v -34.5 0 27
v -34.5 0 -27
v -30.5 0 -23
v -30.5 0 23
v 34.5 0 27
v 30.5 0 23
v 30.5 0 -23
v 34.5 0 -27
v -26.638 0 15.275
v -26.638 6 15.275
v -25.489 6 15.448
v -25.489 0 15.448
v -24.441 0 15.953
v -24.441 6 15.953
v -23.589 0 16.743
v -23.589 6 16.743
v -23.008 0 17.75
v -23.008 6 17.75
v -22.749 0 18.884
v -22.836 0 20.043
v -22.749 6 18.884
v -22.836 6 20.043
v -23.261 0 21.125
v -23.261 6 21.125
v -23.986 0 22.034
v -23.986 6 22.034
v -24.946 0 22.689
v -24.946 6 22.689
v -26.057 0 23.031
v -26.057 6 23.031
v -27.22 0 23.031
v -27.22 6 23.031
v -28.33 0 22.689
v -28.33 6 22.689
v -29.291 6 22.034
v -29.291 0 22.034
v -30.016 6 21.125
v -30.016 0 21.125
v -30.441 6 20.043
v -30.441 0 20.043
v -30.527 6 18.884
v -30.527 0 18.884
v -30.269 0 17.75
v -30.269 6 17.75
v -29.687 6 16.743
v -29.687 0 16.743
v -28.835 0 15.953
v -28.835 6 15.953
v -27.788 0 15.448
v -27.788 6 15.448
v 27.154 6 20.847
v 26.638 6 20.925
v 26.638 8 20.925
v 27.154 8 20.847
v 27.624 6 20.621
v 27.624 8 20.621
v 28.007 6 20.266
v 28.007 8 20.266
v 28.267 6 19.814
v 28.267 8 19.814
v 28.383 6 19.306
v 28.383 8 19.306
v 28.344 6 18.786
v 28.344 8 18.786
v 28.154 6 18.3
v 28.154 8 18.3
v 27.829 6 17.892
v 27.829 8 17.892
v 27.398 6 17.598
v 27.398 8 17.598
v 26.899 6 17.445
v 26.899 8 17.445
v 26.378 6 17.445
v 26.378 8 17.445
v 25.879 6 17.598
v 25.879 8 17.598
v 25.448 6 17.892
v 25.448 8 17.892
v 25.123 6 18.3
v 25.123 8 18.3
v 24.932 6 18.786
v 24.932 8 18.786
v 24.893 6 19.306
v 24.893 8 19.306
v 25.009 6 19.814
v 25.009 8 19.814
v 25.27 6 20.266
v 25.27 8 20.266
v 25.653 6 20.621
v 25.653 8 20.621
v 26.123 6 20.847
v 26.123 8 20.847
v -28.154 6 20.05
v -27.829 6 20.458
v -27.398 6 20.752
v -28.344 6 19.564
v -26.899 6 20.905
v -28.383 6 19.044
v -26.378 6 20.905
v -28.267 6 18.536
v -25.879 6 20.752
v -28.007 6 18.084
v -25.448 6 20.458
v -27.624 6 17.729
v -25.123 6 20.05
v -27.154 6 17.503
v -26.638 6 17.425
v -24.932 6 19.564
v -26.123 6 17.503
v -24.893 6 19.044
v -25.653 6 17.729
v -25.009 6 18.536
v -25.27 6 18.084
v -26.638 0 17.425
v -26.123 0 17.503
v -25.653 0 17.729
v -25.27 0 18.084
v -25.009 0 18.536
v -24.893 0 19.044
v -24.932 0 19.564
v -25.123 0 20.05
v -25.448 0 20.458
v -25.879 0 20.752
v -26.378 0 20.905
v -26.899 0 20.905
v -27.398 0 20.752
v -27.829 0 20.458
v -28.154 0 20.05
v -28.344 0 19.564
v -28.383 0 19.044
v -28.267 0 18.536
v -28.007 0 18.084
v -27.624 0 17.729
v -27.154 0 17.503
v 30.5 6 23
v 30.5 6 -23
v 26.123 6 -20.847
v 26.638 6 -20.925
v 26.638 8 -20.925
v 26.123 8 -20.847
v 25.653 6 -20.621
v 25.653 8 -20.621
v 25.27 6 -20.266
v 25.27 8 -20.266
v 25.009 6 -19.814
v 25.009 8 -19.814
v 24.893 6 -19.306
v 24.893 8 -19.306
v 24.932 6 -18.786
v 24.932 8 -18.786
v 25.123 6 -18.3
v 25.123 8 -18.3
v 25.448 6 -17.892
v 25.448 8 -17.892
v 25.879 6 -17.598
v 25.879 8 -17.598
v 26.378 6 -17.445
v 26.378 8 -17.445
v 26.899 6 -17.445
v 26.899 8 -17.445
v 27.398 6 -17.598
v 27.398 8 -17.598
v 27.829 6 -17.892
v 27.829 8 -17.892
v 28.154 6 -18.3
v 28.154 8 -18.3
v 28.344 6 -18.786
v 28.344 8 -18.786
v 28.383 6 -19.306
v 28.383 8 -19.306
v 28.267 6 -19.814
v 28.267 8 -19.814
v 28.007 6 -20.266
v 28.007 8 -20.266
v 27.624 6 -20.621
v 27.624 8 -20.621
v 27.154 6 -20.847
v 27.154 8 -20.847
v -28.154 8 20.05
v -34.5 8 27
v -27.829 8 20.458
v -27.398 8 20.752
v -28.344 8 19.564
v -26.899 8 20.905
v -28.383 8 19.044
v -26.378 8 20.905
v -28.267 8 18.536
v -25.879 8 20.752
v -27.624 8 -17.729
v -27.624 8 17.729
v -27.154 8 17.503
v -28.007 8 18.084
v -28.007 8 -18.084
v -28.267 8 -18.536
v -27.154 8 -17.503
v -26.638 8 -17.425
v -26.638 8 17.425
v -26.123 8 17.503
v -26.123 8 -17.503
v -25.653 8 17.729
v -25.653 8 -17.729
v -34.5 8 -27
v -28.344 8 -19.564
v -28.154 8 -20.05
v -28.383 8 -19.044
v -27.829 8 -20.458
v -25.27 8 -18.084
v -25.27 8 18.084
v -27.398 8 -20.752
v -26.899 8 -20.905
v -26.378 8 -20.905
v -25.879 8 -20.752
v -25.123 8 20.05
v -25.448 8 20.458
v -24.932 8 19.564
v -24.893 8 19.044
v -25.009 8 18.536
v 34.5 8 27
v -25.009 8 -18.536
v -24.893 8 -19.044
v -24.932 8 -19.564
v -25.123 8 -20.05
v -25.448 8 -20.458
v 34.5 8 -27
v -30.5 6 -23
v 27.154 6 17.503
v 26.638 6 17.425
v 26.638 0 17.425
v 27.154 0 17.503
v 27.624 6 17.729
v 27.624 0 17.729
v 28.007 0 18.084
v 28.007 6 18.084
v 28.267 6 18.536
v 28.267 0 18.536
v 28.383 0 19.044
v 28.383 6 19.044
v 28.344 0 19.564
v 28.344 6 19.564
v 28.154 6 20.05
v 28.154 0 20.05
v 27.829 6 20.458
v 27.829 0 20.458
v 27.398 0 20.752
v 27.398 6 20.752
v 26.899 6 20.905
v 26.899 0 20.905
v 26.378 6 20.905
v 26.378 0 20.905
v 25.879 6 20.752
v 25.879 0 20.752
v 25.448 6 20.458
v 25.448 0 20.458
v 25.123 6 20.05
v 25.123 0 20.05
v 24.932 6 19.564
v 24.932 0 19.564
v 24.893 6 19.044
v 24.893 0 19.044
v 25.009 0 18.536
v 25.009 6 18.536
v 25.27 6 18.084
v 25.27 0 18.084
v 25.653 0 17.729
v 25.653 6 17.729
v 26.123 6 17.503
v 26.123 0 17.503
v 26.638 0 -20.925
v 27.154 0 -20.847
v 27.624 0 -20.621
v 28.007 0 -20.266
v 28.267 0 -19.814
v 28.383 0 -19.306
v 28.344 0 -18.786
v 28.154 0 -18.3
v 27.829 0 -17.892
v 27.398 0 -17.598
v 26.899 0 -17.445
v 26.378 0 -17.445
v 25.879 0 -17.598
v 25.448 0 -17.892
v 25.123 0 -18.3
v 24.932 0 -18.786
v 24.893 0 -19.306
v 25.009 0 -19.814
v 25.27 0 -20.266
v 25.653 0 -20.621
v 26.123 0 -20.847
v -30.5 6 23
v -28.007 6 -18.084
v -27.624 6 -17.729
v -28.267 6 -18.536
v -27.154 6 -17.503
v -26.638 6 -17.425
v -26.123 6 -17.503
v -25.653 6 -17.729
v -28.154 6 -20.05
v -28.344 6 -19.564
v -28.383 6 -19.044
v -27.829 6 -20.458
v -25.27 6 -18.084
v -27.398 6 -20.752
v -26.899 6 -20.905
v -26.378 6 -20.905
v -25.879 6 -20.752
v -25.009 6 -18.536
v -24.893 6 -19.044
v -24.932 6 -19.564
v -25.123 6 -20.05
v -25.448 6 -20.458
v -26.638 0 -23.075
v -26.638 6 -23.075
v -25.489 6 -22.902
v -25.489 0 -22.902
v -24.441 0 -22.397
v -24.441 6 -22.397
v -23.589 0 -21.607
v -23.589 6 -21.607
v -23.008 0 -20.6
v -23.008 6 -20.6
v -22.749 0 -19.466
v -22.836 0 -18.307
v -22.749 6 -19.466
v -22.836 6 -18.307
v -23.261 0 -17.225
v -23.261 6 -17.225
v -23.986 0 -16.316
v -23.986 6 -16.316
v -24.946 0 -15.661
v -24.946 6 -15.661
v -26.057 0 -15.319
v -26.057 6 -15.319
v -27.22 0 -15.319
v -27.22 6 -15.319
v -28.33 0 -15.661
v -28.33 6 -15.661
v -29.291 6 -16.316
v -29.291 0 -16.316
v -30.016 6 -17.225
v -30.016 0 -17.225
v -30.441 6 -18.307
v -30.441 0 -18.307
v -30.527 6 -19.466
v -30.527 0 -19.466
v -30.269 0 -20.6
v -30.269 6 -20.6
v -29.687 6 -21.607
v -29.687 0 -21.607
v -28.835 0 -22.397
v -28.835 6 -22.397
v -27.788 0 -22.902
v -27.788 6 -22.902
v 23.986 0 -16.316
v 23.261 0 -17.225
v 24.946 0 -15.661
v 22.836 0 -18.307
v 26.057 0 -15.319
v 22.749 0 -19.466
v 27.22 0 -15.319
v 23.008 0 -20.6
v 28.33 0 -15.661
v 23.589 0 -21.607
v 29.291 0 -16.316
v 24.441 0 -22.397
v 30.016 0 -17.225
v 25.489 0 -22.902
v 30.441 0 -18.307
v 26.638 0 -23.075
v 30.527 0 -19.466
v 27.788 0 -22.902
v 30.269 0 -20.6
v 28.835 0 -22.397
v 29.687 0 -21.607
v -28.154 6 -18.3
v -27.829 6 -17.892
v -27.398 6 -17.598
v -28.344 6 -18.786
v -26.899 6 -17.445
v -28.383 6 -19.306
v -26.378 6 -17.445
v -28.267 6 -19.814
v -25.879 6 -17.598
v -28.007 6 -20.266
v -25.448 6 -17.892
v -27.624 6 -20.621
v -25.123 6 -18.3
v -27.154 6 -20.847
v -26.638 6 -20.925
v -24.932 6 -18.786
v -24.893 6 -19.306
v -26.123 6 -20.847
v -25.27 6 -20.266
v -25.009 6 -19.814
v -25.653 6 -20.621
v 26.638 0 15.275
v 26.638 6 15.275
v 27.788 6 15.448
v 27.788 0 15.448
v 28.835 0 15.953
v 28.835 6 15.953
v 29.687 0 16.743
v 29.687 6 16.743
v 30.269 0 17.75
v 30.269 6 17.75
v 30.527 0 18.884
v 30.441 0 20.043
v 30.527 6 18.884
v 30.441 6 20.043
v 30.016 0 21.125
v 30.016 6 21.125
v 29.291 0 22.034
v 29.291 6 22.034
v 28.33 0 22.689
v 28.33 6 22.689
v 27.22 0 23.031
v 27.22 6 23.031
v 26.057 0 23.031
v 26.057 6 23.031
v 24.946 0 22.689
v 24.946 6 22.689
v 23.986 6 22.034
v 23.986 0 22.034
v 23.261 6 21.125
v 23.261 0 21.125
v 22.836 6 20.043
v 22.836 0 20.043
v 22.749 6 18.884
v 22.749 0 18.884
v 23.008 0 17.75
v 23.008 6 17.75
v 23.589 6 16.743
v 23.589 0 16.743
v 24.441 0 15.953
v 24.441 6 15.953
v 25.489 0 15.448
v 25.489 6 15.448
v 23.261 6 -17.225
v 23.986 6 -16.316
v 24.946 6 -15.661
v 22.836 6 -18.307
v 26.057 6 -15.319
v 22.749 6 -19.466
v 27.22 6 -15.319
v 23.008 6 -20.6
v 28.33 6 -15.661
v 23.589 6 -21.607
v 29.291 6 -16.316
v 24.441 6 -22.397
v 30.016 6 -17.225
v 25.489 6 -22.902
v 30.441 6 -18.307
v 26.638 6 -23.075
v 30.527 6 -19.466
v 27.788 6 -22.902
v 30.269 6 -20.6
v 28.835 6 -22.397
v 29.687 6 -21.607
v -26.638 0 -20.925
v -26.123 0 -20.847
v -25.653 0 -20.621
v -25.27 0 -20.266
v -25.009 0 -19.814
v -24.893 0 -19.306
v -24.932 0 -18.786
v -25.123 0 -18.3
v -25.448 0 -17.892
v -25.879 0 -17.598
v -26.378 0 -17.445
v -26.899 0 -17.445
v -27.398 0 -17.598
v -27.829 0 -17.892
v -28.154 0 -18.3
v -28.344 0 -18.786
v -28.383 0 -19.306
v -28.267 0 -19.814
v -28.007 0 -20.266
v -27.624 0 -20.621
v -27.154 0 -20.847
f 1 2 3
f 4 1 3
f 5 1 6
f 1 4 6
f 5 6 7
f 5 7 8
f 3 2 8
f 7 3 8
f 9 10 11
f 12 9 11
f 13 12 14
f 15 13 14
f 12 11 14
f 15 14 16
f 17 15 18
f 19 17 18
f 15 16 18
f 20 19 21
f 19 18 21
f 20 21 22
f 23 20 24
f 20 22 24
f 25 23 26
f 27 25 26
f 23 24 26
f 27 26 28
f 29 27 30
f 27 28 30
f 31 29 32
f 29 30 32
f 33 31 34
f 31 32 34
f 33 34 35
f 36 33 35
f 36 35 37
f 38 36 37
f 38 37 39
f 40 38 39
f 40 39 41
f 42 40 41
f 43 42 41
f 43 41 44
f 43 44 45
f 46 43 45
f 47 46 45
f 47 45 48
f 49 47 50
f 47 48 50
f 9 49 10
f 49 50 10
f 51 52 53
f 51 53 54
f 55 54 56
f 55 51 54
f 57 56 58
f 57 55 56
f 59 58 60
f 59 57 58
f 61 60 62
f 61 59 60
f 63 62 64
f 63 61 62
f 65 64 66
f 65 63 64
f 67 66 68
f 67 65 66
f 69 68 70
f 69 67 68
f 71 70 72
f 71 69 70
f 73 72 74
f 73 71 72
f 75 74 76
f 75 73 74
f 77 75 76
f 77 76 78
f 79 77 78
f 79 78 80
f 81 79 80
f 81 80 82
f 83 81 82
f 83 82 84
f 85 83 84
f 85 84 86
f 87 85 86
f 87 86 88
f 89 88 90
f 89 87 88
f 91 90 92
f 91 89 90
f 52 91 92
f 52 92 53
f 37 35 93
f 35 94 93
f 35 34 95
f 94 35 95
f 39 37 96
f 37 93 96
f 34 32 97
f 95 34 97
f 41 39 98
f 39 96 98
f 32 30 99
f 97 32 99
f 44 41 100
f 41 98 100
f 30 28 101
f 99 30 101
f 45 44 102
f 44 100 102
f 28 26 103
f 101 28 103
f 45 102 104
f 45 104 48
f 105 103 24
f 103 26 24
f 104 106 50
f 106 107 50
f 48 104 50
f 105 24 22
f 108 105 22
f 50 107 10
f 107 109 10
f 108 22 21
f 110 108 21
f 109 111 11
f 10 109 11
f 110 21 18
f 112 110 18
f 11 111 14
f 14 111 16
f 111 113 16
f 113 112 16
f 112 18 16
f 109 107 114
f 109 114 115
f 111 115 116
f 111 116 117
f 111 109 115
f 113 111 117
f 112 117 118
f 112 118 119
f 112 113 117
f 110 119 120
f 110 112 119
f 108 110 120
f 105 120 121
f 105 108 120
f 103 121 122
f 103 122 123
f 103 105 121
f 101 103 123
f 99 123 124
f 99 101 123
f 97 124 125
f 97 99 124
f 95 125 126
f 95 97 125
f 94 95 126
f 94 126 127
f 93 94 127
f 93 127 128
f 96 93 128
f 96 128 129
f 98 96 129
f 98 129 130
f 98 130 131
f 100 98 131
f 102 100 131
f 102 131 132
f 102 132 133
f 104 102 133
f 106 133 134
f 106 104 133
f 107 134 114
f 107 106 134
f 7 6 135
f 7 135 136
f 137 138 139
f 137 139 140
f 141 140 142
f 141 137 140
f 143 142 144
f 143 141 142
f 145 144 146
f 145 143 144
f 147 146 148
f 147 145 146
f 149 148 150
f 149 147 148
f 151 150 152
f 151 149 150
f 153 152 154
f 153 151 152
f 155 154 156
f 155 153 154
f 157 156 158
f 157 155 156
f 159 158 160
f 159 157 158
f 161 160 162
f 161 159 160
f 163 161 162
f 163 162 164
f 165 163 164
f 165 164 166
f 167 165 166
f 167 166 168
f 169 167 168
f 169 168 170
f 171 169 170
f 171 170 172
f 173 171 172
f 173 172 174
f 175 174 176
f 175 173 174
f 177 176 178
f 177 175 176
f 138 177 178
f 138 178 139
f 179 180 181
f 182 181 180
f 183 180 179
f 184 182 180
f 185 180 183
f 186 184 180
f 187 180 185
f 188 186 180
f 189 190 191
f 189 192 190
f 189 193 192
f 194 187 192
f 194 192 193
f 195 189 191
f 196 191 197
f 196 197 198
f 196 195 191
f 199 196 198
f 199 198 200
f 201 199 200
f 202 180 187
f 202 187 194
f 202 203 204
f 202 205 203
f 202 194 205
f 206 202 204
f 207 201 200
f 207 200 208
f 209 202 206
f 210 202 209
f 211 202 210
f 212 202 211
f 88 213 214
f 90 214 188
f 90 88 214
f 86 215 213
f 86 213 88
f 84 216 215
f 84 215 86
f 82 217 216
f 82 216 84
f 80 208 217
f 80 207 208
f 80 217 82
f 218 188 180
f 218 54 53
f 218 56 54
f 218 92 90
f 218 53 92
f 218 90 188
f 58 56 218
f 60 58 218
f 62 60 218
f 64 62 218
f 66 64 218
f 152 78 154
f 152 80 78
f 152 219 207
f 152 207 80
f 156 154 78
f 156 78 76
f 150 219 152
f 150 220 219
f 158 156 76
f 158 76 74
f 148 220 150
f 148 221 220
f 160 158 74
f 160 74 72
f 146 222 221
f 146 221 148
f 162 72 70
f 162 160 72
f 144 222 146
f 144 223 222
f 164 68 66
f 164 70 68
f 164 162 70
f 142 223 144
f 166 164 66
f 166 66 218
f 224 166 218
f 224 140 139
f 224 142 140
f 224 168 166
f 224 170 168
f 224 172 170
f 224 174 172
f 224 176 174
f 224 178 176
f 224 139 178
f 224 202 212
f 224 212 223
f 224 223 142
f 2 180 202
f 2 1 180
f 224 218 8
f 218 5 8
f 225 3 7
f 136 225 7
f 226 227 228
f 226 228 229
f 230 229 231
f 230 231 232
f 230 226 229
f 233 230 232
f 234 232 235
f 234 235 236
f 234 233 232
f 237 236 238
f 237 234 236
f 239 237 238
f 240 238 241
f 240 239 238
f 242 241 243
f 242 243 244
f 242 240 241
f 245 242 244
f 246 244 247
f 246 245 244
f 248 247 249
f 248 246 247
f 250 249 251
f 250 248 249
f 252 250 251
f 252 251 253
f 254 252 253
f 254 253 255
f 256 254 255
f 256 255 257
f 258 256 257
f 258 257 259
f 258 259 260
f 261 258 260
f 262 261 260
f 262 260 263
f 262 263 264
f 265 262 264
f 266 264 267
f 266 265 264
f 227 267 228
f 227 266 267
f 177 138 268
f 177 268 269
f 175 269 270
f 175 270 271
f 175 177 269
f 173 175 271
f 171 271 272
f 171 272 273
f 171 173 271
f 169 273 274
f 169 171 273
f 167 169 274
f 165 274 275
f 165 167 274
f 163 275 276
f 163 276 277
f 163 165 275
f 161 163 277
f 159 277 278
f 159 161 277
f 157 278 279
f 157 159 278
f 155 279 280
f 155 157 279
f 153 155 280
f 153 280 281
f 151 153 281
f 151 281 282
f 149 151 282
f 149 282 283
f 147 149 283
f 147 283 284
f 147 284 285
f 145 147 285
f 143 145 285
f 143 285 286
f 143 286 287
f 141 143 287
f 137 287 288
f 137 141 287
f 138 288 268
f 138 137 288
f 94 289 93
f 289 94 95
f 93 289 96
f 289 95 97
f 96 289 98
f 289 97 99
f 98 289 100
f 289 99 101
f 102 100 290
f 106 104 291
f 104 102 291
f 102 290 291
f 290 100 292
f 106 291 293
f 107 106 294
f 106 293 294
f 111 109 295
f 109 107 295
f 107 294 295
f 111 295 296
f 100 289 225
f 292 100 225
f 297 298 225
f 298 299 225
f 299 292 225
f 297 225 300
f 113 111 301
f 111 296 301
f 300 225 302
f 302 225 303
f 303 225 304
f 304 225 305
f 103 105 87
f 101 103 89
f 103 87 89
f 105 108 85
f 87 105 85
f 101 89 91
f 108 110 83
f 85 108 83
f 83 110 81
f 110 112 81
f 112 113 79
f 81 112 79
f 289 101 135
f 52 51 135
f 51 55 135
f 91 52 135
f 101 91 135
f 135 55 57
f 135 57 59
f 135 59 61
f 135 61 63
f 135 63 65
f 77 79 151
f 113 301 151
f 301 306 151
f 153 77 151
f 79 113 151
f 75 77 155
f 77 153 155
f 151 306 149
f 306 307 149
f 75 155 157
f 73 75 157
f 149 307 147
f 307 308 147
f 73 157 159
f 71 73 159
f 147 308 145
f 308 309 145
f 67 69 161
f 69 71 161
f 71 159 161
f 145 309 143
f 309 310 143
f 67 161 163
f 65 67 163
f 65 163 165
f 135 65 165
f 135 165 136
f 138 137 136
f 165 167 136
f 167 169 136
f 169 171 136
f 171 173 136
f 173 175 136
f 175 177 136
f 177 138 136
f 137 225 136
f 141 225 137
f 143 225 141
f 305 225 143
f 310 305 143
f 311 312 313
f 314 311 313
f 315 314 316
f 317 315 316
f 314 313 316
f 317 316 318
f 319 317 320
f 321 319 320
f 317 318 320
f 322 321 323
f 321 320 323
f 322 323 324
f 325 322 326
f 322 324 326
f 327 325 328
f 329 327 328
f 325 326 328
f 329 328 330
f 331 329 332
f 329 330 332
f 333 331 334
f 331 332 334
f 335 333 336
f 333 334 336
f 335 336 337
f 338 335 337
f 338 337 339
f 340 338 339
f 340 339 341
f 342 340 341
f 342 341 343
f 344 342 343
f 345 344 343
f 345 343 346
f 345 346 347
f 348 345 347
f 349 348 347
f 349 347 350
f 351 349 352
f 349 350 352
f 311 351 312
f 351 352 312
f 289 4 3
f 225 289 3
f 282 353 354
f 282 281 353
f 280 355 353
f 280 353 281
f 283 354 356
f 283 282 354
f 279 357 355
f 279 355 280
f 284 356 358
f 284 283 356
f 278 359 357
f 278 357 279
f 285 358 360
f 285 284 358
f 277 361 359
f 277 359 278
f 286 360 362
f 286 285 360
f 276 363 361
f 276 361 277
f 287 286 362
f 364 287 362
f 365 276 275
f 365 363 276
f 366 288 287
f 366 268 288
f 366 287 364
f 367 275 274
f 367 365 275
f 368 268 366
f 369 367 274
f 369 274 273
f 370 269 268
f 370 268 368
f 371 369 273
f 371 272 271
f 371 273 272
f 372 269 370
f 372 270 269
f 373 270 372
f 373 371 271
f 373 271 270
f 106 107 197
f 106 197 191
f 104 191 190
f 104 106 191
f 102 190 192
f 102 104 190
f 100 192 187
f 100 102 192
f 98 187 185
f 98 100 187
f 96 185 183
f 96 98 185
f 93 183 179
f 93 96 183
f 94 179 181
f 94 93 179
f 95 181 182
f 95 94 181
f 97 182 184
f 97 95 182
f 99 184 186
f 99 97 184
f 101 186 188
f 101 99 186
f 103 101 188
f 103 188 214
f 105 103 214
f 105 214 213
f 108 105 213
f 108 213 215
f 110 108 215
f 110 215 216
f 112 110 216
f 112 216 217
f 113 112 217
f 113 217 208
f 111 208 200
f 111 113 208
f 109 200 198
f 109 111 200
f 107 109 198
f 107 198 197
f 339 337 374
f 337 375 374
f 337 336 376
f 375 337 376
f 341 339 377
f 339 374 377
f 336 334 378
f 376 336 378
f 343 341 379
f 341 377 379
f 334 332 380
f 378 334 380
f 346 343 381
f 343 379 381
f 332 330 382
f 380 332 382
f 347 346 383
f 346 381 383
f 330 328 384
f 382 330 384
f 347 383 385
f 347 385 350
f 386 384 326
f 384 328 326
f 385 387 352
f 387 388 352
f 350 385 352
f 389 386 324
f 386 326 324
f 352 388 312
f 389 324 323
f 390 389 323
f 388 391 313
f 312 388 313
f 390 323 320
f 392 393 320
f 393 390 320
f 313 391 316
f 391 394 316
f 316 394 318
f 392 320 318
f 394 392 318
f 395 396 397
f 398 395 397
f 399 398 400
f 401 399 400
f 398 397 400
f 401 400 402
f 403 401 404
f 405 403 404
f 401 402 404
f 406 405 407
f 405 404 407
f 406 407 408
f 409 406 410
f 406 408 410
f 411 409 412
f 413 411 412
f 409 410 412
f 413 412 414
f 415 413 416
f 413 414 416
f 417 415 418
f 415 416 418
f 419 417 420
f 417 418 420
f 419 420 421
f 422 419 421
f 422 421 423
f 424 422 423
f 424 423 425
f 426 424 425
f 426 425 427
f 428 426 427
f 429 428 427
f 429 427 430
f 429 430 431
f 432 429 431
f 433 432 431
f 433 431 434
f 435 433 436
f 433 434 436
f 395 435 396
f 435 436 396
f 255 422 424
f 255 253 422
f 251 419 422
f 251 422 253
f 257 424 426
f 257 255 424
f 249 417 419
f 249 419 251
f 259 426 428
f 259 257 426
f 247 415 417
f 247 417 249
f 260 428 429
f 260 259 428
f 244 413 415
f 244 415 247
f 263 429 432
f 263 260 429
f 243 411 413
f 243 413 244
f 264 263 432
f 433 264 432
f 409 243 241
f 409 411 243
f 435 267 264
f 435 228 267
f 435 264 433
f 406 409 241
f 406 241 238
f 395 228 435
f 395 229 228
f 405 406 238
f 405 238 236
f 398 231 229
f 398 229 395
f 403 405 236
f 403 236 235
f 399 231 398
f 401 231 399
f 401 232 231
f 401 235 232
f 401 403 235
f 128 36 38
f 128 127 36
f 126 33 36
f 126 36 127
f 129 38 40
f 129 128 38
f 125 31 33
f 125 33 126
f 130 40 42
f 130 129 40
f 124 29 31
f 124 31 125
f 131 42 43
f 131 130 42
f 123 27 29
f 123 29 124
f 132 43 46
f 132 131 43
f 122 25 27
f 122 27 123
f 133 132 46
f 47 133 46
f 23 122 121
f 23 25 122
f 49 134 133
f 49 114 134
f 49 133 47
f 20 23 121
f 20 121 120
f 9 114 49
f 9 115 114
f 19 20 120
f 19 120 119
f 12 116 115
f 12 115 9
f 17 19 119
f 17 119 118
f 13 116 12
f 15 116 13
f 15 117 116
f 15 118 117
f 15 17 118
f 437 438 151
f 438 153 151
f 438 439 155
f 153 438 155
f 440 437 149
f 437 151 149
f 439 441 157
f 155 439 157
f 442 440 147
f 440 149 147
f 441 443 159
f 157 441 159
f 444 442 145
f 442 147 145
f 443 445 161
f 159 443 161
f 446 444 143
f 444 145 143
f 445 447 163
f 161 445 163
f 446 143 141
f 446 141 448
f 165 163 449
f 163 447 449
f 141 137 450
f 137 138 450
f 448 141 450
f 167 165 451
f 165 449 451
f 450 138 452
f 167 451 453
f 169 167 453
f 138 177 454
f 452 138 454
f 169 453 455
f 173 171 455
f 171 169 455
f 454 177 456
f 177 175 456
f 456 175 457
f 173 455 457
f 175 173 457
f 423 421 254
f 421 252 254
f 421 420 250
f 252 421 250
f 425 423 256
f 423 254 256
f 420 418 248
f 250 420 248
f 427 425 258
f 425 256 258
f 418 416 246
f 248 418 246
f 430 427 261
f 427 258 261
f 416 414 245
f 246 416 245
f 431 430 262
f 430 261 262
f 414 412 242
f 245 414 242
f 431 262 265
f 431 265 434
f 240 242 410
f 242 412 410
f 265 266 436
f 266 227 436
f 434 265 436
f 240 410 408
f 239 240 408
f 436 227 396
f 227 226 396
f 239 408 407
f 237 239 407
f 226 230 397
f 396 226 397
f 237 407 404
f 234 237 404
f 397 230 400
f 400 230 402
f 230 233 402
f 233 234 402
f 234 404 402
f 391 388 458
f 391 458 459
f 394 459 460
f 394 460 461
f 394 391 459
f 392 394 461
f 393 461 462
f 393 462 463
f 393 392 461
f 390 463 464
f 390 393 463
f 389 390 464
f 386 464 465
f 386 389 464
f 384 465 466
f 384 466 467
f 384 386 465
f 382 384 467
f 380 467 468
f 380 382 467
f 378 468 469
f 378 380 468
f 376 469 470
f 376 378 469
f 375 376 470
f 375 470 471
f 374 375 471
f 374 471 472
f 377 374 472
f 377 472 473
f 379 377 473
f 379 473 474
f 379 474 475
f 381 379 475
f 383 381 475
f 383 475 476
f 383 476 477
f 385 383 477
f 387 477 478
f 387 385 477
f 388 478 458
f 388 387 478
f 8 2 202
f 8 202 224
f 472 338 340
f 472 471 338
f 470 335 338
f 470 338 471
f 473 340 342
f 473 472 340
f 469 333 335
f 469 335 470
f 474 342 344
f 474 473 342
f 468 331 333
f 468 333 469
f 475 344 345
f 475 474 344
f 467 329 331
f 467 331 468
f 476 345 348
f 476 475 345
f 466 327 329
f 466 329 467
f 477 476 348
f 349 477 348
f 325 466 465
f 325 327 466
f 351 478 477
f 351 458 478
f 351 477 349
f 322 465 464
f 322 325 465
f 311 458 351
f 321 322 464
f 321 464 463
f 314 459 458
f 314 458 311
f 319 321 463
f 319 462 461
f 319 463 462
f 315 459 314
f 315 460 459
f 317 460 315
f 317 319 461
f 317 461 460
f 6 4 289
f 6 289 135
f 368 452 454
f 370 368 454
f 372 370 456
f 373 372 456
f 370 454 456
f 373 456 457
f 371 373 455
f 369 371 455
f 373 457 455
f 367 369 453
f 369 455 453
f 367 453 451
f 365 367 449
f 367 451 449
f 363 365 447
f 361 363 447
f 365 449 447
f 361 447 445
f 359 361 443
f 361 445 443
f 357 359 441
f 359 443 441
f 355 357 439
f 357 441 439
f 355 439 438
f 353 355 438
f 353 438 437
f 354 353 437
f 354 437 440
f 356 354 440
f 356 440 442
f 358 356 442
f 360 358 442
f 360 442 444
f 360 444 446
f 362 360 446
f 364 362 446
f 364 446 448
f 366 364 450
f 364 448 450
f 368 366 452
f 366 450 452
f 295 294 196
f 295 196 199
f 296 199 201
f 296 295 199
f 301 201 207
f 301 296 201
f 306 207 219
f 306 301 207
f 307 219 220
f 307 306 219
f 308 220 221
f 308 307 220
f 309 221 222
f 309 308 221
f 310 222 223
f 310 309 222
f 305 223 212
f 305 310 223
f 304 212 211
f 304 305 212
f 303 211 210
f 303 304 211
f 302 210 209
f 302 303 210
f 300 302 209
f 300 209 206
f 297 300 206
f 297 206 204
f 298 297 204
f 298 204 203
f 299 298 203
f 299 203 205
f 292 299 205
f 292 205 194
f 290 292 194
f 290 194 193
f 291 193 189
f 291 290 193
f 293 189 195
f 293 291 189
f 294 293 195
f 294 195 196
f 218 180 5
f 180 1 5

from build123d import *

# Parameters (mm, degrees)
SKETCH1_W             = 69
SKETCH1_H             = 54
SKETCH1_W_2           = 61
SKETCH1_H_2           = 46
BOSS_EXTRUDE1_DEPTH   = 6
SKETCH2_W             = 69
SKETCH2_H             = 54
SKETCH2_R             = 1.75
BOSS_EXTRUDE2_DEPTH   = 2
SKETCH3_R             = 3.9
SKETCH3_R_2           = 1.75
BOSS_EXTRUDE5_DEPTH   = 6
BOSS_EXTRUDE5_2_DEPTH = 6
BOSS_EXTRUDE5_3_DEPTH = 6
BOSS_EXTRUDE5_4_DEPTH = 6


with BuildPart() as part:
    # Sketch1 → Boss-Extrude1 (new body)
    with BuildSketch(Plane(origin=(0, 0, 0), x_dir=(1, 0, 0), z_dir=(0, 1, 0))):
        Rectangle(SKETCH1_W, SKETCH1_H)
        Rectangle(SKETCH1_W_2, SKETCH1_H_2, mode=Mode.SUBTRACT)
    extrude(amount=BOSS_EXTRUDE1_DEPTH)

    # Sketch2 → Boss-Extrude2 (add)
    with BuildSketch(Plane(origin=(0, 6, 0), x_dir=(1, 0, 0), z_dir=(0, 1, 0))):
        Rectangle(SKETCH2_W, SKETCH2_H)
        with Locations(Location((-26.638347595, 19.175016295, 0), (0, 0, 270))):
            Circle(SKETCH2_R, mode=Mode.SUBTRACT)
        with Locations(Location((26.638347595, 19.175016295, 0), (0, 0, 90))):
            Circle(SKETCH2_R, mode=Mode.SUBTRACT)
        with Locations(Location((26.638347595, -19.175016295, 0), (0, 0, 270))):
            Circle(SKETCH2_R, mode=Mode.SUBTRACT)
        with Locations(Location((-26.638347595, -19.175016295, 0), (0, 0, 90))):
            Circle(SKETCH2_R, mode=Mode.SUBTRACT)
    extrude(amount=BOSS_EXTRUDE2_DEPTH)


with BuildPart() as body_2:
    # Sketch3 → Boss-Extrude5 (new body)
    with BuildSketch(Plane.XZ.offset(-6)):
        with Locations(Location((-26.638347595, 19.175016295, 0), (0, 0, 270))):
            Circle(SKETCH3_R)
        with Locations(Location((-26.638347595, 19.175016295, 0), (0, 0, 270))):
            Circle(SKETCH3_R_2, mode=Mode.SUBTRACT)
    extrude(amount=BOSS_EXTRUDE5_DEPTH)


with BuildPart() as body_3:
    # Sketch3 → Boss-Extrude5 2 (new body)
    with BuildSketch(Plane.XZ.offset(-6)):
        with Locations(Location((-26.638347595, -19.175016295, 0), (0, 0, 270))):
            Circle(SKETCH3_R)
        with Locations(Location((-26.638347595, -19.175016295, 0), (0, 0, 270))):
            Circle(SKETCH3_R_2, mode=Mode.SUBTRACT)
    extrude(amount=BOSS_EXTRUDE5_2_DEPTH)


with BuildPart() as body_4:
    # Sketch3 → Boss-Extrude5 3 (new body)
    with BuildSketch(Plane.XZ.offset(-6)):
        with Locations(Location((26.638347595, -19.175016295, 0), (0, 0, 270))):
            Circle(SKETCH3_R)
        with Locations(Location((26.638347595, -19.175016295, 0), (0, 0, 270))):
            Circle(SKETCH3_R_2, mode=Mode.SUBTRACT)
    extrude(amount=BOSS_EXTRUDE5_3_DEPTH)


with BuildPart() as body_5:
    # Sketch3 → Boss-Extrude5 4 (new body)
    with BuildSketch(Plane.XZ.offset(-6)):
        with Locations(Location((26.638347595, 19.175016295, 0), (0, 0, 270))):
            Circle(SKETCH3_R)
        with Locations(Location((26.638347595, 19.175016295, 0), (0, 0, 270))):
            Circle(SKETCH3_R_2, mode=Mode.SUBTRACT)
    extrude(amount=BOSS_EXTRUDE5_4_DEPTH)


solid = Compound([part.part, body_2.part, body_3.part, body_4.part, body_5.part])
